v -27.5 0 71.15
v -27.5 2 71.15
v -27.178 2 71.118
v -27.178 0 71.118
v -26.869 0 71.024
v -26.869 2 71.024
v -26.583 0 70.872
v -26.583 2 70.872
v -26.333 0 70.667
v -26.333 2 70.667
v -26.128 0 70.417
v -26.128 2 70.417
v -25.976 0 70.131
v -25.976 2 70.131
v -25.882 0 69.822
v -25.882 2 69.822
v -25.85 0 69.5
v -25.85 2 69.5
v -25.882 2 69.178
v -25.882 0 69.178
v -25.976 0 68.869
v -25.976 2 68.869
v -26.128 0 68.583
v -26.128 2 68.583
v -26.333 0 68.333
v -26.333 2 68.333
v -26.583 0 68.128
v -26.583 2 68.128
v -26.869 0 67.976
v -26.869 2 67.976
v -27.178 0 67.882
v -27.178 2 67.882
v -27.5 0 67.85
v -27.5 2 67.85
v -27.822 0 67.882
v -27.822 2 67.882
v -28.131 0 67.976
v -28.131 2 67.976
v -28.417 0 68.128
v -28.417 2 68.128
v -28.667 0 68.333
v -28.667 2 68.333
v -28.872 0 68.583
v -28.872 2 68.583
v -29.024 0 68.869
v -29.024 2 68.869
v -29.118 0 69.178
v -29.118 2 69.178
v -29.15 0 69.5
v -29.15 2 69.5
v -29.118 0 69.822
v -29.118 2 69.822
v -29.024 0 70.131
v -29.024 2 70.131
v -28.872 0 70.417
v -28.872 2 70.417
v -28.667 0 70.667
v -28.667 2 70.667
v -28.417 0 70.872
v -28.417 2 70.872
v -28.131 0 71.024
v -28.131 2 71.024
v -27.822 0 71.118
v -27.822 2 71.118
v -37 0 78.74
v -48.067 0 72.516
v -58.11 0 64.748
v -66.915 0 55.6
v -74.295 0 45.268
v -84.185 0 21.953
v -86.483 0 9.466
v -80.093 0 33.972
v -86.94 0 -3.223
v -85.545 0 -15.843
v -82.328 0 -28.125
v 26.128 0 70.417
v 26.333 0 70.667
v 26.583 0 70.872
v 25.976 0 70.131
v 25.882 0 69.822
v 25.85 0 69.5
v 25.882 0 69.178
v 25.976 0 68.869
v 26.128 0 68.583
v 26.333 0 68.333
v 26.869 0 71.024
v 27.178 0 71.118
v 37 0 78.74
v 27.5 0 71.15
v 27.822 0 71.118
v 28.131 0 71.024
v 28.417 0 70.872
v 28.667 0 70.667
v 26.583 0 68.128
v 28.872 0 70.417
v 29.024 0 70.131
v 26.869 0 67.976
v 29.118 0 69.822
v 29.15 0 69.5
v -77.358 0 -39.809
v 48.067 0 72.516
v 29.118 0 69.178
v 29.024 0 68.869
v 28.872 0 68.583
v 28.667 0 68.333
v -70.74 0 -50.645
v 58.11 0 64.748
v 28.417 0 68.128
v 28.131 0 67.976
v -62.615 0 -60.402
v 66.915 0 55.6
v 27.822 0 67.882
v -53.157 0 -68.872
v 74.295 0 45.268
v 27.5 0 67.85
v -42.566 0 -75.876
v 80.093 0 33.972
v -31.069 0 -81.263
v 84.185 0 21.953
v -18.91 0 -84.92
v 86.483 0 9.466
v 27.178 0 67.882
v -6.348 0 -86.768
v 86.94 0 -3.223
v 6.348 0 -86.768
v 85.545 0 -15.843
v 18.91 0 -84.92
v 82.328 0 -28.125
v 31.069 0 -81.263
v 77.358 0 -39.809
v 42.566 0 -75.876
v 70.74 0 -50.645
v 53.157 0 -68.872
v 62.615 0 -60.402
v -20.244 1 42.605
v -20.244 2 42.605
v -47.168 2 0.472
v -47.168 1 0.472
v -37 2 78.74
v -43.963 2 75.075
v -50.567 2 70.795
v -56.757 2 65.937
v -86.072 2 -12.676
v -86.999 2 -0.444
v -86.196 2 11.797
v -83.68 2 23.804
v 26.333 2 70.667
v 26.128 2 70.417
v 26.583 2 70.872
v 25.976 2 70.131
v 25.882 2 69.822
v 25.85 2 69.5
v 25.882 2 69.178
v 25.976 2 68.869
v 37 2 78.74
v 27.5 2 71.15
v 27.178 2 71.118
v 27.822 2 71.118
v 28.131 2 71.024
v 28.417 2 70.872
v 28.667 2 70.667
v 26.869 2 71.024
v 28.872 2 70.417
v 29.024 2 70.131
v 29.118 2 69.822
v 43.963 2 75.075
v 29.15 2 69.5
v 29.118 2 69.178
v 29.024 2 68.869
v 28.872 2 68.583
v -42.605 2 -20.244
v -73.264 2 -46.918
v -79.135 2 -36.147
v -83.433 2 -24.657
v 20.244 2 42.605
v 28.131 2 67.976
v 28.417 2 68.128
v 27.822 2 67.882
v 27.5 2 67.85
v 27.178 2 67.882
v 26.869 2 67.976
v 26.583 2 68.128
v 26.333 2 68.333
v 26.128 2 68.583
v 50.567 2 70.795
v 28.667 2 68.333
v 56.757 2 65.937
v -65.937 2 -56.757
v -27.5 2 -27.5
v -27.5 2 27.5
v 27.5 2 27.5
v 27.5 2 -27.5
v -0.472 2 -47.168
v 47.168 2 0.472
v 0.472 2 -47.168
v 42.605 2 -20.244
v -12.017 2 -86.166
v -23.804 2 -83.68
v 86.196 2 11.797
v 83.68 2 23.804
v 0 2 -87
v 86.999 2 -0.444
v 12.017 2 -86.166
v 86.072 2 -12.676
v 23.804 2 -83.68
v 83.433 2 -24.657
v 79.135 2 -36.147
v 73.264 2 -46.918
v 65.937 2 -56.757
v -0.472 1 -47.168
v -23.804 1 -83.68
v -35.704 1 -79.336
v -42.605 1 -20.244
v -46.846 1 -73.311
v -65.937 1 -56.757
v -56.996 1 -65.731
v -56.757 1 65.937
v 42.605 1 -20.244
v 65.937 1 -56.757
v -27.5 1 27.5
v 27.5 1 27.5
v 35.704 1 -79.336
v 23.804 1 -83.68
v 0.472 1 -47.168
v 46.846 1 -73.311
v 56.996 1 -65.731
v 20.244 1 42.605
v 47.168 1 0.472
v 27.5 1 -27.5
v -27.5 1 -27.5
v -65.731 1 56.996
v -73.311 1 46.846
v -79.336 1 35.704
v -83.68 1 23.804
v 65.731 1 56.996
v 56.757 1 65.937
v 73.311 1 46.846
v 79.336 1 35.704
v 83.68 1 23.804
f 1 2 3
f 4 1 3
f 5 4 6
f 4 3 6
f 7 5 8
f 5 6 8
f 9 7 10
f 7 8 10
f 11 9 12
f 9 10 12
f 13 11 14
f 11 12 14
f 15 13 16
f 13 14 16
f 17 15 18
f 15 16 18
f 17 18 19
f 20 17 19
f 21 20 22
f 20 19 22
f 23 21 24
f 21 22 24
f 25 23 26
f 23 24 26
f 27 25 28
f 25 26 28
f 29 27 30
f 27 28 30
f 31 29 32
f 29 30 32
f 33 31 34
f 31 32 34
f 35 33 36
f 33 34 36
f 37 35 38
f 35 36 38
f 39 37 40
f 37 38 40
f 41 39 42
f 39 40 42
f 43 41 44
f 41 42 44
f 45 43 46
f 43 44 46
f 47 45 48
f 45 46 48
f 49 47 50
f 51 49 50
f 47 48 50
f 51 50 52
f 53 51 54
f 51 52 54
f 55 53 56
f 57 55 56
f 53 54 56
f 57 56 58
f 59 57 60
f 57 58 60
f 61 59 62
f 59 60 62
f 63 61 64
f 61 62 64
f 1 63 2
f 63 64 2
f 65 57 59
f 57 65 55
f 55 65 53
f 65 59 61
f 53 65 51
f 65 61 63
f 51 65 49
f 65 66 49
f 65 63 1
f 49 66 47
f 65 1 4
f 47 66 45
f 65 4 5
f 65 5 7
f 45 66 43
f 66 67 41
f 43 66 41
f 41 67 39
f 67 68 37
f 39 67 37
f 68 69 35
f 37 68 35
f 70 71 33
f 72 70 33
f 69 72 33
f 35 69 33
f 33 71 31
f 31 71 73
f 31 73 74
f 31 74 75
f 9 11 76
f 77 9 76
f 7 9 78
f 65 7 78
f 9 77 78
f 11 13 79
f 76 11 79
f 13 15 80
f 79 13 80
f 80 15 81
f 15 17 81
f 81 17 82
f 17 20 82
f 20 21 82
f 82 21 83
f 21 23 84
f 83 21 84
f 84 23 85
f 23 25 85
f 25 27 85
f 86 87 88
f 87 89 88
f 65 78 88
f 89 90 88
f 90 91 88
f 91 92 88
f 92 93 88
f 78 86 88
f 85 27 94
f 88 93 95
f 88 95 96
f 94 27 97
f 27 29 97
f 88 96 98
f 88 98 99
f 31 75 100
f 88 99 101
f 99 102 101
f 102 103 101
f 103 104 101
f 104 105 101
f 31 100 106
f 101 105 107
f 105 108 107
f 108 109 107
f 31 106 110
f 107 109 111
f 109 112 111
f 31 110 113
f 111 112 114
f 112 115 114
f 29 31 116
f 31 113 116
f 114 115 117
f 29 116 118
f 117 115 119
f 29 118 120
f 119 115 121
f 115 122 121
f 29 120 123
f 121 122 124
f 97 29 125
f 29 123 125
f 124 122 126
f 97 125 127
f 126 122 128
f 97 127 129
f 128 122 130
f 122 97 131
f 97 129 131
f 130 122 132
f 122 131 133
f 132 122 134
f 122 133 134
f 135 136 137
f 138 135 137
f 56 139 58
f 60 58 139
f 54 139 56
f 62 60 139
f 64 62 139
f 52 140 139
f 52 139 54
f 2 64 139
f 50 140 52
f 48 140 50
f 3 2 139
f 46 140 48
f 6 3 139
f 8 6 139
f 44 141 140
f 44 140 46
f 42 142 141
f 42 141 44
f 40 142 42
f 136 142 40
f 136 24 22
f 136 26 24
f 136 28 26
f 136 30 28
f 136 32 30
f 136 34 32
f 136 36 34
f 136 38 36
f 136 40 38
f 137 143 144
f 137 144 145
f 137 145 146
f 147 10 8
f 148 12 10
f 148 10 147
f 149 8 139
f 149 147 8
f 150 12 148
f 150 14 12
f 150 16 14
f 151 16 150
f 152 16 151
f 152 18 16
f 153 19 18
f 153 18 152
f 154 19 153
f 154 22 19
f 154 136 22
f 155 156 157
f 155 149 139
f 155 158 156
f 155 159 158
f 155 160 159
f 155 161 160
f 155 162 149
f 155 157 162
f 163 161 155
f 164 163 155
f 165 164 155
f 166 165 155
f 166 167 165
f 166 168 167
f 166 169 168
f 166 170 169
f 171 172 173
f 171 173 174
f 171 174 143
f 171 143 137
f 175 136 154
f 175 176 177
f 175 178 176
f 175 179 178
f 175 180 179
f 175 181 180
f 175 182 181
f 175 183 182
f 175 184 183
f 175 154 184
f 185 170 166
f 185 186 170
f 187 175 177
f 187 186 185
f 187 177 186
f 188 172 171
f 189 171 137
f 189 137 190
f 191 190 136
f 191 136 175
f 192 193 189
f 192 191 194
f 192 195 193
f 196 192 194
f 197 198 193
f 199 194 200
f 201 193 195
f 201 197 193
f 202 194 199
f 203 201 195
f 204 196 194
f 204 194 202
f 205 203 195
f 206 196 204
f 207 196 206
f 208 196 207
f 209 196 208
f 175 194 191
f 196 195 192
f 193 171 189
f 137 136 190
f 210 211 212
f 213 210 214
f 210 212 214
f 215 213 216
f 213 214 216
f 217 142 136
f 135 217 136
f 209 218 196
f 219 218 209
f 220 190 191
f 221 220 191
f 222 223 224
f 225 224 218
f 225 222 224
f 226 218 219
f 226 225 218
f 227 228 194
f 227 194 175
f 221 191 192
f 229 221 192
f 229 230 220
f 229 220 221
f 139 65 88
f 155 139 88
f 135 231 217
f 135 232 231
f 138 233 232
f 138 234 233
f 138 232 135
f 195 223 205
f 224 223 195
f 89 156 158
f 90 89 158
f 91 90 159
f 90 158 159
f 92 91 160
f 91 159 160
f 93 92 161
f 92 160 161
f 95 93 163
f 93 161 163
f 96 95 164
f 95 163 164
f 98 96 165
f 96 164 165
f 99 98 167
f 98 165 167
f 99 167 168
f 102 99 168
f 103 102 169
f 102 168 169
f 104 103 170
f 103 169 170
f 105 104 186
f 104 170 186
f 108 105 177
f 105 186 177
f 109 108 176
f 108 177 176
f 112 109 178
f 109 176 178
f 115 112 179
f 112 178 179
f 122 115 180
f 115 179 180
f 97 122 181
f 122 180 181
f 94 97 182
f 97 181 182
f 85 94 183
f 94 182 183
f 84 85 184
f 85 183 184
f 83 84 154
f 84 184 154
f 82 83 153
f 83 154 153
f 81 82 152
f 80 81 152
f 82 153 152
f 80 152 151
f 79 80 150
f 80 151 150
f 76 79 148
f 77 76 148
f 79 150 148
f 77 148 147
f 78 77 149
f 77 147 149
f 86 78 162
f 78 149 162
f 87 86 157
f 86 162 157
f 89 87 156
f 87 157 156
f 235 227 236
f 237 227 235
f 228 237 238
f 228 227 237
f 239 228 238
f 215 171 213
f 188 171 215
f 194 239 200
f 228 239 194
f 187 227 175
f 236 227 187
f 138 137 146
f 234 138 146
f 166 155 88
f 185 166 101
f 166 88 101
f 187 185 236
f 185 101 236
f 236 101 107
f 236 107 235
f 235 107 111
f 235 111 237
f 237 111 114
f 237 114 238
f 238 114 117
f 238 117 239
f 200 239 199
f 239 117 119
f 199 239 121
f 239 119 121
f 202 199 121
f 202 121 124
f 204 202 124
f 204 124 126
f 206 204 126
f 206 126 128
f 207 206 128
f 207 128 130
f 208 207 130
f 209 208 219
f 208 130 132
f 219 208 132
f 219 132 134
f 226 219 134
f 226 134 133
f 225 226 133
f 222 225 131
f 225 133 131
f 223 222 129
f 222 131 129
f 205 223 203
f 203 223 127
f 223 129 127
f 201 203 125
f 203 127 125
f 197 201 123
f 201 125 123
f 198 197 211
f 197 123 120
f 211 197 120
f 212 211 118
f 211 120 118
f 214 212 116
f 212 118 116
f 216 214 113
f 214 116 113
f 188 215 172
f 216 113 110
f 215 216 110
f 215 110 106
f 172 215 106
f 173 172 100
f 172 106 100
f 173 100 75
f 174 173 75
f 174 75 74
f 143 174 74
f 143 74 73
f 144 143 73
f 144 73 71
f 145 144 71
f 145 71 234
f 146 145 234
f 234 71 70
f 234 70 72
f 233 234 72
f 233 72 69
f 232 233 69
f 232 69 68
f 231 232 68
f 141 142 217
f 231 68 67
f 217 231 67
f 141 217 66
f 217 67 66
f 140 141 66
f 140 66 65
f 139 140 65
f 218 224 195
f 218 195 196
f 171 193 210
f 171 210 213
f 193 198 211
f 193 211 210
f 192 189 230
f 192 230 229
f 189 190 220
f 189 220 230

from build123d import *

# Parameters (mm, degrees)
RESSALTO_EXTRUS_O1_DEPTH = 2
ESBO_O3_W                = 55
ESBO_O3_H                = 55
CORTE_EXTRUS_O1_DEPTH    = 1
CORTE_EXTRUS_O2_DEPTH    = 1
ESPELHAR1_START          = 1
ESPELHAR1_DEPTH          = 1
ESBO_O5_R                = 1.65
CORTE_EXTRUS_O3_DEPTH    = 2


# Read off the part's stored shape, not the designer's step: Espelhar1
with BuildPart() as part:
    # Esboço2 → Ressalto-extrusão1 (new body)
    with BuildSketch(Plane(origin=(0, 0, 0), x_dir=(1, 0, 0), z_dir=(0, 1, 0))):
        with BuildLine():
            Line((-37, -78.74007874), (37, -78.74007874))
            ThreePointArc((37, -78.74007874), (0, 87), (-37, -78.74007874))
        make_face()
    extrude(amount=RESSALTO_EXTRUS_O1_DEPTH)

    # Esboço3 → Corte-extrusão1 (cut)
    with BuildSketch(Plane(origin=(0, 2, 0), x_dir=(1, 0, 0), z_dir=(0, 1, 0))):
        Rectangle(ESBO_O3_W, ESBO_O3_H)
    extrude(amount=-CORTE_EXTRUS_O1_DEPTH, mode=Mode.SUBTRACT)

    # Esboço4 → Corte-extrusão2 (cut)
    with BuildSketch(Plane(origin=(0, 2, 0), x_dir=(1, 0, 0), z_dir=(0, 1, 0))):
        Polygon((-0.472209327, 47.167542), (-42.60471375, 20.244465077), (-69.527790673, 62.376969501), (-27.39528625, 89.300046424), align=None)
        Polygon((-20.244465077, -42.60471375), (-47.167542, -0.472209327), (-89.300046424, -27.39528625), (-62.376969501, -69.527790673), align=None)
    extrude(amount=-CORTE_EXTRUS_O2_DEPTH, mode=Mode.SUBTRACT)

    # Espelhar1 outline → Espelhar1 (cut)
    with BuildSketch(Plane(origin=(0, 0, 0), x_dir=(1, 0, 0), z_dir=(0, 1, 0)).offset(ESPELHAR1_START)):
        with BuildLine():
            Line((42.60471375, 20.244465077), (65.936611163, 56.757055141))
            ThreePointArc((65.936611163, 56.757055141), (46.846153846, 73.310557697), (23.80410674, 83.680132064))
            Line((23.80410674, 83.680132064), (0.472209327, 47.167542))
            Line((0.472209327, 47.167542), (42.60471375, 20.244465077))
        make_face()
        with BuildLine():
            ThreePointArc((56.757055141, -65.936611163), (73.310557697, -46.846153846), (83.680132064, -23.80410674))
            Line((83.680132064, -23.80410674), (47.167542, -0.472209327))
            Line((47.167542, -0.472209327), (20.244465077, -42.60471375))
            Line((20.244465077, -42.60471375), (56.757055141, -65.936611163))
        make_face()
    extrude(amount=ESPELHAR1_DEPTH, mode=Mode.SUBTRACT)

    # Esboço5 → Corte-extrusão3 (cut)
    with BuildSketch(Plane(origin=(0, 2, 0), x_dir=(1, 0, 0), z_dir=(0, 1, 0))):
        with Locations(Location((-27.5, -69.5, 0), (0, 0, 270))):
            Circle(ESBO_O5_R)
        with Locations(Location((27.5, -69.5, 0), (0, 0, 270))):
            Circle(ESBO_O5_R)
    extrude(amount=-CORTE_EXTRUS_O3_DEPTH, mode=Mode.SUBTRACT)


solid = part.part
